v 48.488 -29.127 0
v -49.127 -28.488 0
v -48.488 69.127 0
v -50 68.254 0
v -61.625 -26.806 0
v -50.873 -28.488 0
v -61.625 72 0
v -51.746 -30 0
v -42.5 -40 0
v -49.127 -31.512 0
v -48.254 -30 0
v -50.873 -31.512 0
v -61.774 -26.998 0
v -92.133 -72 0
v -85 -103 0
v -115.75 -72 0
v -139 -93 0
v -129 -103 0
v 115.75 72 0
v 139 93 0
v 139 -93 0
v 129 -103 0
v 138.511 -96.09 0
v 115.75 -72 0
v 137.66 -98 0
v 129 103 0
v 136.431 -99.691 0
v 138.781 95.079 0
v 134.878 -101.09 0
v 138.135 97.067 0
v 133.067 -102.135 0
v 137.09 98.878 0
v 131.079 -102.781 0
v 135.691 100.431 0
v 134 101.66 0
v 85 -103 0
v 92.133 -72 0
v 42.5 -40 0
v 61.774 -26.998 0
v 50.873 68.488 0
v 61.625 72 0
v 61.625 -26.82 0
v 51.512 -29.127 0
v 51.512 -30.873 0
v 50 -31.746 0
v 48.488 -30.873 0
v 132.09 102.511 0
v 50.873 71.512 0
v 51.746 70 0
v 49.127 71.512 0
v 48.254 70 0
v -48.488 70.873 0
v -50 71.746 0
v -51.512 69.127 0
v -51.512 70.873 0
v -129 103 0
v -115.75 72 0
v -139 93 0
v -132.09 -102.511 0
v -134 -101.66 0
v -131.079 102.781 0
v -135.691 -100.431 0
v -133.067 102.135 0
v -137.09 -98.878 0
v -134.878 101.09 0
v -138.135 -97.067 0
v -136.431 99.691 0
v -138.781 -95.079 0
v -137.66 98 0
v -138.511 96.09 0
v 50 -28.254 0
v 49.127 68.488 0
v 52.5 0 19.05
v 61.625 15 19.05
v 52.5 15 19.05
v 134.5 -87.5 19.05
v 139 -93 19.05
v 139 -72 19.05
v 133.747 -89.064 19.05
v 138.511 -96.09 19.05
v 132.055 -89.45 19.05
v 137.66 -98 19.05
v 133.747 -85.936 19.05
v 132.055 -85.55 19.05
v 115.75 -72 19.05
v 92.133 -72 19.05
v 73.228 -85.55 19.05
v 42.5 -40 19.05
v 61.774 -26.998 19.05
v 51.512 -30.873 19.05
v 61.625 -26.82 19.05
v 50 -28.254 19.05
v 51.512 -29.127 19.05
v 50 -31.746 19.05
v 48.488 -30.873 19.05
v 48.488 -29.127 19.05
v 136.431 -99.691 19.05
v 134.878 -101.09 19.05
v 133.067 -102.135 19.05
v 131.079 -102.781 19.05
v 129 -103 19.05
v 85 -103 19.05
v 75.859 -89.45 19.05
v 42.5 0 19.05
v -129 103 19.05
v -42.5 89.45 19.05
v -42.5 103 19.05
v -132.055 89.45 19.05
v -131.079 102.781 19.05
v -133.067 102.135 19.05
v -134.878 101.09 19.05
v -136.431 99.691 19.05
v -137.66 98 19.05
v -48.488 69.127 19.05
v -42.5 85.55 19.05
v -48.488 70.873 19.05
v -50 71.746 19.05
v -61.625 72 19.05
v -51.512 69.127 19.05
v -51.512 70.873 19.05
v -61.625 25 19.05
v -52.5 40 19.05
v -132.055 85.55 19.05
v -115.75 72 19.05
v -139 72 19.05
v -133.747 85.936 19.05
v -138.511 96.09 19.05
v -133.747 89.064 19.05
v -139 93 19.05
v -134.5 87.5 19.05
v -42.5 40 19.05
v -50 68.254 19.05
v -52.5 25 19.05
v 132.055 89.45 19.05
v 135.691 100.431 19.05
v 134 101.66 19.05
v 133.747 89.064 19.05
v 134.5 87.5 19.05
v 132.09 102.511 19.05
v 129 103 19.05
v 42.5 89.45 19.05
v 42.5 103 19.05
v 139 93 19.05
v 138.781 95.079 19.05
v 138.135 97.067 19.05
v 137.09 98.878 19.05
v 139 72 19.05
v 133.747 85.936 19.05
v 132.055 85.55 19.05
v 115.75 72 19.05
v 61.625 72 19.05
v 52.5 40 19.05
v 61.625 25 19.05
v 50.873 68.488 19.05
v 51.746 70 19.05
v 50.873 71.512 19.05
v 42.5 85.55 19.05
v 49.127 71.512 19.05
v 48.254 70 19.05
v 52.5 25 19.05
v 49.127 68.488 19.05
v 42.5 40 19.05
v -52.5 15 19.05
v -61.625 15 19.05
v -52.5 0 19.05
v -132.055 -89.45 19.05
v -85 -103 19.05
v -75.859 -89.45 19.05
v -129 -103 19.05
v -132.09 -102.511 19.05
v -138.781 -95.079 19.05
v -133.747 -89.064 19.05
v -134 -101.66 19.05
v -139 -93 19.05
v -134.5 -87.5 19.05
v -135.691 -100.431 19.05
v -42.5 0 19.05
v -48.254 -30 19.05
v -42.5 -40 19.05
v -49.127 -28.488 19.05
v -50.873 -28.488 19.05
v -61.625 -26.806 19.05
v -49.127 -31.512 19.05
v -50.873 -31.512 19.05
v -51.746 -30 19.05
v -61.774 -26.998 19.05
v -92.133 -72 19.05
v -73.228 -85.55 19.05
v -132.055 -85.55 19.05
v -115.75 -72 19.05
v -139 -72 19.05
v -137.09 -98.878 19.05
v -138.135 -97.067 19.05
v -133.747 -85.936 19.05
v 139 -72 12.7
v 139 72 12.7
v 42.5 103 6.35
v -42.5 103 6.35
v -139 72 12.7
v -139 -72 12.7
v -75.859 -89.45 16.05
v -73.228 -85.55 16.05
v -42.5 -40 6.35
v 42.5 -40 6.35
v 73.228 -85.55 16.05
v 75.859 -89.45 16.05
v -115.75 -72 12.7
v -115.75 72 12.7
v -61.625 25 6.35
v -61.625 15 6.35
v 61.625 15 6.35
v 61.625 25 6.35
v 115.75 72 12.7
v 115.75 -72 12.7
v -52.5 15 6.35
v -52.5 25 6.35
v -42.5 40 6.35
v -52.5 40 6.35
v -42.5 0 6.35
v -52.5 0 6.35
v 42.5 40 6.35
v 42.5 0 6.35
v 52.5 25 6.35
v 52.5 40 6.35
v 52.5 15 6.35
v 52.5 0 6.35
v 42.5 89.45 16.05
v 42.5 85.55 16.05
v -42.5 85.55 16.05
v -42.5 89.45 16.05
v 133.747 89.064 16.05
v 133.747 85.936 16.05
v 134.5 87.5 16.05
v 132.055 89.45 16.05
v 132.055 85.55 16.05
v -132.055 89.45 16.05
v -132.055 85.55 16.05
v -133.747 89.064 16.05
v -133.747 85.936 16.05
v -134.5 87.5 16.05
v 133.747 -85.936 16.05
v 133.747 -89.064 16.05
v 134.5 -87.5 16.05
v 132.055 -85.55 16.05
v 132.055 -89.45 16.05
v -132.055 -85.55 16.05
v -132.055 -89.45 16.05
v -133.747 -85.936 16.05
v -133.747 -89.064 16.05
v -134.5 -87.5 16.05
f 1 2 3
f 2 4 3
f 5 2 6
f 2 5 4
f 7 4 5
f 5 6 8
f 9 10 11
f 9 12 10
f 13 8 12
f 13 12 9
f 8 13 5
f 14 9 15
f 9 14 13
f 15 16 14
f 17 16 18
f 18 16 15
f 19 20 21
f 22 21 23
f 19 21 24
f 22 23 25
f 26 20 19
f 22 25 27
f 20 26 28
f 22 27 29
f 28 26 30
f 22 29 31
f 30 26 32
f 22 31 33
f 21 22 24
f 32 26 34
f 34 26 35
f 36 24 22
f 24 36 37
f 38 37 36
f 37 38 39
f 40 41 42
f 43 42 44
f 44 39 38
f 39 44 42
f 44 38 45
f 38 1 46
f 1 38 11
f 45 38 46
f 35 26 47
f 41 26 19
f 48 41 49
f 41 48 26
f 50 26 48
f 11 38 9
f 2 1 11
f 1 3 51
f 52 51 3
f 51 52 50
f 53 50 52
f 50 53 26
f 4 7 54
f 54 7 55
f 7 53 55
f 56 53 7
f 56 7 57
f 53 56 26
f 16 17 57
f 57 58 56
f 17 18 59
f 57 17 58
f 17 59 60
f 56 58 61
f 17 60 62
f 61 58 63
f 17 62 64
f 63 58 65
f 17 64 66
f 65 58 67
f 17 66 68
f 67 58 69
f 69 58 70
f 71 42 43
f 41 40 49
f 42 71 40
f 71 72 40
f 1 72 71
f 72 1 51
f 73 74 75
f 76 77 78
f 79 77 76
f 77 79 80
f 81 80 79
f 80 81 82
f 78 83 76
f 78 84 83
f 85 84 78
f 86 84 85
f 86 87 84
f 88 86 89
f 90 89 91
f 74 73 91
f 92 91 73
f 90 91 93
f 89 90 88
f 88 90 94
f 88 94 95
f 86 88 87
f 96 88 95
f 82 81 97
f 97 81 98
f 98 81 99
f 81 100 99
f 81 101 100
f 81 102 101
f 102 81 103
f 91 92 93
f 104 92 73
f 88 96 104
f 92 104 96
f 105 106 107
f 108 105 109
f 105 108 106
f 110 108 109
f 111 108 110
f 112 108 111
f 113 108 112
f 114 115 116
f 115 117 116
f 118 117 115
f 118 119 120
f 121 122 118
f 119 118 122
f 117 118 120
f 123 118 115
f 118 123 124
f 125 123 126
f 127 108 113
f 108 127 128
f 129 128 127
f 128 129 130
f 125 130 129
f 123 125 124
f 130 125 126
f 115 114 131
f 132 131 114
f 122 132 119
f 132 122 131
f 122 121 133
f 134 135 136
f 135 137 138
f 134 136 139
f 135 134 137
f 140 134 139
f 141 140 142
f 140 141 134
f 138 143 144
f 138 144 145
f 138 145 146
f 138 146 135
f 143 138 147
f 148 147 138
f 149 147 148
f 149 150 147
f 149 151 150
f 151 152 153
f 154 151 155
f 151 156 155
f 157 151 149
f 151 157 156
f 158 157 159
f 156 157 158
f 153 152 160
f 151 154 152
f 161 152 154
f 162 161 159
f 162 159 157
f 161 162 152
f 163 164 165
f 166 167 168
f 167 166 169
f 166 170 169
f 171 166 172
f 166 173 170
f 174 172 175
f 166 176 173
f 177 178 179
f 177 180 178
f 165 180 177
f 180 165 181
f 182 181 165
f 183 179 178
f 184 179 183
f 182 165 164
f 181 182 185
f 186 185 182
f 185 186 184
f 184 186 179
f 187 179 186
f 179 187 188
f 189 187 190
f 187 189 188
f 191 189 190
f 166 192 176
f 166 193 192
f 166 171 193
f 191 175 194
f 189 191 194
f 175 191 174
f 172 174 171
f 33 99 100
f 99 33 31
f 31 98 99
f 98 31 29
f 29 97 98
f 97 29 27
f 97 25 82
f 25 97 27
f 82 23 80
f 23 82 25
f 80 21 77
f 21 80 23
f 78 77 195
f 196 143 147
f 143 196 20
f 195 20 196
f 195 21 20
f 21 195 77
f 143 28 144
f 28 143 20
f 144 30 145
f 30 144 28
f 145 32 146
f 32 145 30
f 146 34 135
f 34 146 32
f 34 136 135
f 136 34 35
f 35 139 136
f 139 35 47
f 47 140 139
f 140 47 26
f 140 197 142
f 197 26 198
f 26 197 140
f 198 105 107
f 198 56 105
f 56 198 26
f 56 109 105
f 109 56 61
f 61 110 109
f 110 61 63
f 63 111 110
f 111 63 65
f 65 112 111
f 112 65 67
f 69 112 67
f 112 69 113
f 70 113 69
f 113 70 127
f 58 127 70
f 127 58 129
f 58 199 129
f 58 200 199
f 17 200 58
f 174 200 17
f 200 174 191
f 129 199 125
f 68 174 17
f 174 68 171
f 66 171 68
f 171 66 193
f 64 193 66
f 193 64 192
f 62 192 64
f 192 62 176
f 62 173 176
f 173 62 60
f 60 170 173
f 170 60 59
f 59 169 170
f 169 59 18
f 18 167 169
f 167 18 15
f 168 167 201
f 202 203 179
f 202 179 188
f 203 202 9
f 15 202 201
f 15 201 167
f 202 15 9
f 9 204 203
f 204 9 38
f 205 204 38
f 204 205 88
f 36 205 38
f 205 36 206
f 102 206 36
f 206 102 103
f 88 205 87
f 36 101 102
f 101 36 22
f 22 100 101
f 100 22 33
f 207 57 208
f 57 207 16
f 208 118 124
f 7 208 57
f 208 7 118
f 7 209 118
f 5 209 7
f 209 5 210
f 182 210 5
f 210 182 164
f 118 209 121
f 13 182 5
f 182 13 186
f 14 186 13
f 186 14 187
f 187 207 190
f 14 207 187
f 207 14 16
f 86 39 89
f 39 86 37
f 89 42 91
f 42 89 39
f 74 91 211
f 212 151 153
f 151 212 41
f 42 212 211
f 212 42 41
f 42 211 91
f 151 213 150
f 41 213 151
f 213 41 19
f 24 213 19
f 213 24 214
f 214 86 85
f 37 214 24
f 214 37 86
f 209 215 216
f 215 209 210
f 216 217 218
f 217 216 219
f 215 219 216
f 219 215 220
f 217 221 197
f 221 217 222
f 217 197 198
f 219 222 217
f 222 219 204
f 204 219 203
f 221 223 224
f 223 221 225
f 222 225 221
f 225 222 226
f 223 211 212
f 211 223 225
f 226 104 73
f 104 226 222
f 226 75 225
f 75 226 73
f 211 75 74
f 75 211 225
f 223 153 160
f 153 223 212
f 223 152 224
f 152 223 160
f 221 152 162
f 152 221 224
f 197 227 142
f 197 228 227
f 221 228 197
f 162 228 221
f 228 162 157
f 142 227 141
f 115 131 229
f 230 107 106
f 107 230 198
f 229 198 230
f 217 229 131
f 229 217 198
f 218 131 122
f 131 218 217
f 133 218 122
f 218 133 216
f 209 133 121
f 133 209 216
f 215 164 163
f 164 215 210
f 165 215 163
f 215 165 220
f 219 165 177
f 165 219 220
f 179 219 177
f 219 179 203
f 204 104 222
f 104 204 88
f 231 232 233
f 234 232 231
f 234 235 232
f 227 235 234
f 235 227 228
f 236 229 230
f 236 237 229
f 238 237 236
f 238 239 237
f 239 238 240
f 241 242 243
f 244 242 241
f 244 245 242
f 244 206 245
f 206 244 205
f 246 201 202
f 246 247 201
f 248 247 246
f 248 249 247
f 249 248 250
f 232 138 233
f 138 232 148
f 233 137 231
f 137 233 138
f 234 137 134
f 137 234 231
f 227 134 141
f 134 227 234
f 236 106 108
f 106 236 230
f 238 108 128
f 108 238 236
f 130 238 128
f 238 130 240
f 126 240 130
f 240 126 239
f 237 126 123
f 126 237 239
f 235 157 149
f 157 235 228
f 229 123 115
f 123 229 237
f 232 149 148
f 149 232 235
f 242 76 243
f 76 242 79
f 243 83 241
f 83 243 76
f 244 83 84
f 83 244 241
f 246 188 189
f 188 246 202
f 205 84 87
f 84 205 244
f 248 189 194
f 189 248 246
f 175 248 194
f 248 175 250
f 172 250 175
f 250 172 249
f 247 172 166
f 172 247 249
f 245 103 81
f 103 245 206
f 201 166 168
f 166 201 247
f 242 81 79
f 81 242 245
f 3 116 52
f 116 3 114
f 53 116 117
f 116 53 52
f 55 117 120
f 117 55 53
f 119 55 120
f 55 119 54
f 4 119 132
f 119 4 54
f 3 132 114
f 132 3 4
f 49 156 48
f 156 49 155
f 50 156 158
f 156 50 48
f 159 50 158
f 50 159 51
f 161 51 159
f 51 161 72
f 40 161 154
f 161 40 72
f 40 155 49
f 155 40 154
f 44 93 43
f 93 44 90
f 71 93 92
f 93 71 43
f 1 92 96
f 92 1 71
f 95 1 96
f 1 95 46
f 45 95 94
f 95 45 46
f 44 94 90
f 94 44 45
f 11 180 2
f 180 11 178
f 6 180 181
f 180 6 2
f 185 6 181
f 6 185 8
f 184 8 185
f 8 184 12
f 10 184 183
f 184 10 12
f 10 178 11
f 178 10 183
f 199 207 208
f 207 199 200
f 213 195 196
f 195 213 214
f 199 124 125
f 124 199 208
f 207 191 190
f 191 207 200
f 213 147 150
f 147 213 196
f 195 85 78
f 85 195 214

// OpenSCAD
in=25.4;
laptop_x=278;
laptop_y=206;
laptop_corner=10;

wood=in*3/4;
base=wood/2;
vesa=100;
vesa_sizes=[vesa];

mountpoint=20;

pad=15;
pad_offset=15+15/2;

bit=in/8;
screw=bit*1.1;
pocket_overhang=bit;

slot_x=265;
slot_y=4;
slot_gap=175;

wall=laptop_y-slot_gap;
side_wall=wall*3/4;

negative_corner=bit;

module laptop() {
	square([laptop_x,laptop_y],center=true);
}

dock_x=105;
dock_y=40;
dock_z=23;

wire=10;

bundle=85;

vesa_metal=120;

grip_y=laptop_y/2+mountpoint-vesa_metal/2;
grip_top=bundle;
grip_base=bundle*2;
zero=3;

module dock() {
	translate([0,mountpoint]) {
		square([dock_x,dock_y],center=true);
		square([vesa+side_wall*3,wire],center=true);
	}
	square([bundle,laptop_y+pad*2],center=true);
	
}

module wires() {
}

module vesa() {
	translate([0,mountpoint])
	for(vesa=vesa_sizes)
	for(r=[0:90:359])
	rotate([0,0,r])
	translate([vesa/2,vesa/2])
	circle(d=screw);	
}

module cross() {
		translate([0,mountpoint])
		rotate([0,0,45])
		square([wall,laptop_y*2],center=true);
}

module old_negative() {
	offset(negative_corner)
	offset(-negative_corner)
	difference() {
		square([laptop_x-wall,laptop_y-wall*2],center=true);


		dirror_x()
		cross();

	}
}

module valley() {
	difference() {
		square([laptop_x+pad*2,laptop_y-wall*2],center=true);
		square([laptop_x-side_wall*2,laptop_y],center=true);
	}
}

module negative() {
	dock();
}

module grip() {
	hull() {
		translate([-grip_top/2,mountpoint-zero-vesa_metal/2])
		square([grip_top,zero]);
		translate([-grip_base/2,-zero-laptop_y/2])
		square([grip_base,zero]);
	}
}

module body() {
	difference() {
		offset(laptop_corner)
		offset(-laptop_corner)
		laptop();

		grip();
		vent();
	}
}

module vent() {
	difference() {
		square([laptop_x-side_wall*2,laptop_y-wall*2],center=true);
		square([vesa+side_wall,laptop_y+pad*2],center=true);
		offset(side_wall)
		grip();
	}
}


module old_body() {
	difference() {
		offset(laptop_corner)
		offset(-laptop_corner)
		intersection() {
			laptop();
			dirror_x()
			hull() {
				cross();
				translate([0,laptop_y])
				cross();
			}
		}
		negative();
	}
}

module dirror_y() {
	children();
	mirror([0,1])
	children();
}

module dirror_x() {
	children();
	mirror([1,0])
	children();
}

module pads() {
	dirror_y()
	translate([0,slot_gap/2])
	hull()
	dirror_x()
	translate([slot_x/2,0])
	circle(d=slot_y);
}

module cut(h) {
	translate([0,0,wood-h])
	linear_extrude(height=wood+pad*2)
	children();
}

module assembled() {
	difference() {
		linear_extrude(height=wood)
		body();

		cut(in/2)
		dock();

		cut(3)
		pads();

		cut(wood)
		vesa();

		cut(in/4)
		valley();
	}

}

// RENDER svg
module outside_profile() {
	difference() {
		body();
		vesa();
		pads();
	}
}

anchor=10;
anchor_x=-laptop_x/2-anchor*2;
anchor_y=-laptop_y-anchor*2;
preview_height=1;

assembled();
